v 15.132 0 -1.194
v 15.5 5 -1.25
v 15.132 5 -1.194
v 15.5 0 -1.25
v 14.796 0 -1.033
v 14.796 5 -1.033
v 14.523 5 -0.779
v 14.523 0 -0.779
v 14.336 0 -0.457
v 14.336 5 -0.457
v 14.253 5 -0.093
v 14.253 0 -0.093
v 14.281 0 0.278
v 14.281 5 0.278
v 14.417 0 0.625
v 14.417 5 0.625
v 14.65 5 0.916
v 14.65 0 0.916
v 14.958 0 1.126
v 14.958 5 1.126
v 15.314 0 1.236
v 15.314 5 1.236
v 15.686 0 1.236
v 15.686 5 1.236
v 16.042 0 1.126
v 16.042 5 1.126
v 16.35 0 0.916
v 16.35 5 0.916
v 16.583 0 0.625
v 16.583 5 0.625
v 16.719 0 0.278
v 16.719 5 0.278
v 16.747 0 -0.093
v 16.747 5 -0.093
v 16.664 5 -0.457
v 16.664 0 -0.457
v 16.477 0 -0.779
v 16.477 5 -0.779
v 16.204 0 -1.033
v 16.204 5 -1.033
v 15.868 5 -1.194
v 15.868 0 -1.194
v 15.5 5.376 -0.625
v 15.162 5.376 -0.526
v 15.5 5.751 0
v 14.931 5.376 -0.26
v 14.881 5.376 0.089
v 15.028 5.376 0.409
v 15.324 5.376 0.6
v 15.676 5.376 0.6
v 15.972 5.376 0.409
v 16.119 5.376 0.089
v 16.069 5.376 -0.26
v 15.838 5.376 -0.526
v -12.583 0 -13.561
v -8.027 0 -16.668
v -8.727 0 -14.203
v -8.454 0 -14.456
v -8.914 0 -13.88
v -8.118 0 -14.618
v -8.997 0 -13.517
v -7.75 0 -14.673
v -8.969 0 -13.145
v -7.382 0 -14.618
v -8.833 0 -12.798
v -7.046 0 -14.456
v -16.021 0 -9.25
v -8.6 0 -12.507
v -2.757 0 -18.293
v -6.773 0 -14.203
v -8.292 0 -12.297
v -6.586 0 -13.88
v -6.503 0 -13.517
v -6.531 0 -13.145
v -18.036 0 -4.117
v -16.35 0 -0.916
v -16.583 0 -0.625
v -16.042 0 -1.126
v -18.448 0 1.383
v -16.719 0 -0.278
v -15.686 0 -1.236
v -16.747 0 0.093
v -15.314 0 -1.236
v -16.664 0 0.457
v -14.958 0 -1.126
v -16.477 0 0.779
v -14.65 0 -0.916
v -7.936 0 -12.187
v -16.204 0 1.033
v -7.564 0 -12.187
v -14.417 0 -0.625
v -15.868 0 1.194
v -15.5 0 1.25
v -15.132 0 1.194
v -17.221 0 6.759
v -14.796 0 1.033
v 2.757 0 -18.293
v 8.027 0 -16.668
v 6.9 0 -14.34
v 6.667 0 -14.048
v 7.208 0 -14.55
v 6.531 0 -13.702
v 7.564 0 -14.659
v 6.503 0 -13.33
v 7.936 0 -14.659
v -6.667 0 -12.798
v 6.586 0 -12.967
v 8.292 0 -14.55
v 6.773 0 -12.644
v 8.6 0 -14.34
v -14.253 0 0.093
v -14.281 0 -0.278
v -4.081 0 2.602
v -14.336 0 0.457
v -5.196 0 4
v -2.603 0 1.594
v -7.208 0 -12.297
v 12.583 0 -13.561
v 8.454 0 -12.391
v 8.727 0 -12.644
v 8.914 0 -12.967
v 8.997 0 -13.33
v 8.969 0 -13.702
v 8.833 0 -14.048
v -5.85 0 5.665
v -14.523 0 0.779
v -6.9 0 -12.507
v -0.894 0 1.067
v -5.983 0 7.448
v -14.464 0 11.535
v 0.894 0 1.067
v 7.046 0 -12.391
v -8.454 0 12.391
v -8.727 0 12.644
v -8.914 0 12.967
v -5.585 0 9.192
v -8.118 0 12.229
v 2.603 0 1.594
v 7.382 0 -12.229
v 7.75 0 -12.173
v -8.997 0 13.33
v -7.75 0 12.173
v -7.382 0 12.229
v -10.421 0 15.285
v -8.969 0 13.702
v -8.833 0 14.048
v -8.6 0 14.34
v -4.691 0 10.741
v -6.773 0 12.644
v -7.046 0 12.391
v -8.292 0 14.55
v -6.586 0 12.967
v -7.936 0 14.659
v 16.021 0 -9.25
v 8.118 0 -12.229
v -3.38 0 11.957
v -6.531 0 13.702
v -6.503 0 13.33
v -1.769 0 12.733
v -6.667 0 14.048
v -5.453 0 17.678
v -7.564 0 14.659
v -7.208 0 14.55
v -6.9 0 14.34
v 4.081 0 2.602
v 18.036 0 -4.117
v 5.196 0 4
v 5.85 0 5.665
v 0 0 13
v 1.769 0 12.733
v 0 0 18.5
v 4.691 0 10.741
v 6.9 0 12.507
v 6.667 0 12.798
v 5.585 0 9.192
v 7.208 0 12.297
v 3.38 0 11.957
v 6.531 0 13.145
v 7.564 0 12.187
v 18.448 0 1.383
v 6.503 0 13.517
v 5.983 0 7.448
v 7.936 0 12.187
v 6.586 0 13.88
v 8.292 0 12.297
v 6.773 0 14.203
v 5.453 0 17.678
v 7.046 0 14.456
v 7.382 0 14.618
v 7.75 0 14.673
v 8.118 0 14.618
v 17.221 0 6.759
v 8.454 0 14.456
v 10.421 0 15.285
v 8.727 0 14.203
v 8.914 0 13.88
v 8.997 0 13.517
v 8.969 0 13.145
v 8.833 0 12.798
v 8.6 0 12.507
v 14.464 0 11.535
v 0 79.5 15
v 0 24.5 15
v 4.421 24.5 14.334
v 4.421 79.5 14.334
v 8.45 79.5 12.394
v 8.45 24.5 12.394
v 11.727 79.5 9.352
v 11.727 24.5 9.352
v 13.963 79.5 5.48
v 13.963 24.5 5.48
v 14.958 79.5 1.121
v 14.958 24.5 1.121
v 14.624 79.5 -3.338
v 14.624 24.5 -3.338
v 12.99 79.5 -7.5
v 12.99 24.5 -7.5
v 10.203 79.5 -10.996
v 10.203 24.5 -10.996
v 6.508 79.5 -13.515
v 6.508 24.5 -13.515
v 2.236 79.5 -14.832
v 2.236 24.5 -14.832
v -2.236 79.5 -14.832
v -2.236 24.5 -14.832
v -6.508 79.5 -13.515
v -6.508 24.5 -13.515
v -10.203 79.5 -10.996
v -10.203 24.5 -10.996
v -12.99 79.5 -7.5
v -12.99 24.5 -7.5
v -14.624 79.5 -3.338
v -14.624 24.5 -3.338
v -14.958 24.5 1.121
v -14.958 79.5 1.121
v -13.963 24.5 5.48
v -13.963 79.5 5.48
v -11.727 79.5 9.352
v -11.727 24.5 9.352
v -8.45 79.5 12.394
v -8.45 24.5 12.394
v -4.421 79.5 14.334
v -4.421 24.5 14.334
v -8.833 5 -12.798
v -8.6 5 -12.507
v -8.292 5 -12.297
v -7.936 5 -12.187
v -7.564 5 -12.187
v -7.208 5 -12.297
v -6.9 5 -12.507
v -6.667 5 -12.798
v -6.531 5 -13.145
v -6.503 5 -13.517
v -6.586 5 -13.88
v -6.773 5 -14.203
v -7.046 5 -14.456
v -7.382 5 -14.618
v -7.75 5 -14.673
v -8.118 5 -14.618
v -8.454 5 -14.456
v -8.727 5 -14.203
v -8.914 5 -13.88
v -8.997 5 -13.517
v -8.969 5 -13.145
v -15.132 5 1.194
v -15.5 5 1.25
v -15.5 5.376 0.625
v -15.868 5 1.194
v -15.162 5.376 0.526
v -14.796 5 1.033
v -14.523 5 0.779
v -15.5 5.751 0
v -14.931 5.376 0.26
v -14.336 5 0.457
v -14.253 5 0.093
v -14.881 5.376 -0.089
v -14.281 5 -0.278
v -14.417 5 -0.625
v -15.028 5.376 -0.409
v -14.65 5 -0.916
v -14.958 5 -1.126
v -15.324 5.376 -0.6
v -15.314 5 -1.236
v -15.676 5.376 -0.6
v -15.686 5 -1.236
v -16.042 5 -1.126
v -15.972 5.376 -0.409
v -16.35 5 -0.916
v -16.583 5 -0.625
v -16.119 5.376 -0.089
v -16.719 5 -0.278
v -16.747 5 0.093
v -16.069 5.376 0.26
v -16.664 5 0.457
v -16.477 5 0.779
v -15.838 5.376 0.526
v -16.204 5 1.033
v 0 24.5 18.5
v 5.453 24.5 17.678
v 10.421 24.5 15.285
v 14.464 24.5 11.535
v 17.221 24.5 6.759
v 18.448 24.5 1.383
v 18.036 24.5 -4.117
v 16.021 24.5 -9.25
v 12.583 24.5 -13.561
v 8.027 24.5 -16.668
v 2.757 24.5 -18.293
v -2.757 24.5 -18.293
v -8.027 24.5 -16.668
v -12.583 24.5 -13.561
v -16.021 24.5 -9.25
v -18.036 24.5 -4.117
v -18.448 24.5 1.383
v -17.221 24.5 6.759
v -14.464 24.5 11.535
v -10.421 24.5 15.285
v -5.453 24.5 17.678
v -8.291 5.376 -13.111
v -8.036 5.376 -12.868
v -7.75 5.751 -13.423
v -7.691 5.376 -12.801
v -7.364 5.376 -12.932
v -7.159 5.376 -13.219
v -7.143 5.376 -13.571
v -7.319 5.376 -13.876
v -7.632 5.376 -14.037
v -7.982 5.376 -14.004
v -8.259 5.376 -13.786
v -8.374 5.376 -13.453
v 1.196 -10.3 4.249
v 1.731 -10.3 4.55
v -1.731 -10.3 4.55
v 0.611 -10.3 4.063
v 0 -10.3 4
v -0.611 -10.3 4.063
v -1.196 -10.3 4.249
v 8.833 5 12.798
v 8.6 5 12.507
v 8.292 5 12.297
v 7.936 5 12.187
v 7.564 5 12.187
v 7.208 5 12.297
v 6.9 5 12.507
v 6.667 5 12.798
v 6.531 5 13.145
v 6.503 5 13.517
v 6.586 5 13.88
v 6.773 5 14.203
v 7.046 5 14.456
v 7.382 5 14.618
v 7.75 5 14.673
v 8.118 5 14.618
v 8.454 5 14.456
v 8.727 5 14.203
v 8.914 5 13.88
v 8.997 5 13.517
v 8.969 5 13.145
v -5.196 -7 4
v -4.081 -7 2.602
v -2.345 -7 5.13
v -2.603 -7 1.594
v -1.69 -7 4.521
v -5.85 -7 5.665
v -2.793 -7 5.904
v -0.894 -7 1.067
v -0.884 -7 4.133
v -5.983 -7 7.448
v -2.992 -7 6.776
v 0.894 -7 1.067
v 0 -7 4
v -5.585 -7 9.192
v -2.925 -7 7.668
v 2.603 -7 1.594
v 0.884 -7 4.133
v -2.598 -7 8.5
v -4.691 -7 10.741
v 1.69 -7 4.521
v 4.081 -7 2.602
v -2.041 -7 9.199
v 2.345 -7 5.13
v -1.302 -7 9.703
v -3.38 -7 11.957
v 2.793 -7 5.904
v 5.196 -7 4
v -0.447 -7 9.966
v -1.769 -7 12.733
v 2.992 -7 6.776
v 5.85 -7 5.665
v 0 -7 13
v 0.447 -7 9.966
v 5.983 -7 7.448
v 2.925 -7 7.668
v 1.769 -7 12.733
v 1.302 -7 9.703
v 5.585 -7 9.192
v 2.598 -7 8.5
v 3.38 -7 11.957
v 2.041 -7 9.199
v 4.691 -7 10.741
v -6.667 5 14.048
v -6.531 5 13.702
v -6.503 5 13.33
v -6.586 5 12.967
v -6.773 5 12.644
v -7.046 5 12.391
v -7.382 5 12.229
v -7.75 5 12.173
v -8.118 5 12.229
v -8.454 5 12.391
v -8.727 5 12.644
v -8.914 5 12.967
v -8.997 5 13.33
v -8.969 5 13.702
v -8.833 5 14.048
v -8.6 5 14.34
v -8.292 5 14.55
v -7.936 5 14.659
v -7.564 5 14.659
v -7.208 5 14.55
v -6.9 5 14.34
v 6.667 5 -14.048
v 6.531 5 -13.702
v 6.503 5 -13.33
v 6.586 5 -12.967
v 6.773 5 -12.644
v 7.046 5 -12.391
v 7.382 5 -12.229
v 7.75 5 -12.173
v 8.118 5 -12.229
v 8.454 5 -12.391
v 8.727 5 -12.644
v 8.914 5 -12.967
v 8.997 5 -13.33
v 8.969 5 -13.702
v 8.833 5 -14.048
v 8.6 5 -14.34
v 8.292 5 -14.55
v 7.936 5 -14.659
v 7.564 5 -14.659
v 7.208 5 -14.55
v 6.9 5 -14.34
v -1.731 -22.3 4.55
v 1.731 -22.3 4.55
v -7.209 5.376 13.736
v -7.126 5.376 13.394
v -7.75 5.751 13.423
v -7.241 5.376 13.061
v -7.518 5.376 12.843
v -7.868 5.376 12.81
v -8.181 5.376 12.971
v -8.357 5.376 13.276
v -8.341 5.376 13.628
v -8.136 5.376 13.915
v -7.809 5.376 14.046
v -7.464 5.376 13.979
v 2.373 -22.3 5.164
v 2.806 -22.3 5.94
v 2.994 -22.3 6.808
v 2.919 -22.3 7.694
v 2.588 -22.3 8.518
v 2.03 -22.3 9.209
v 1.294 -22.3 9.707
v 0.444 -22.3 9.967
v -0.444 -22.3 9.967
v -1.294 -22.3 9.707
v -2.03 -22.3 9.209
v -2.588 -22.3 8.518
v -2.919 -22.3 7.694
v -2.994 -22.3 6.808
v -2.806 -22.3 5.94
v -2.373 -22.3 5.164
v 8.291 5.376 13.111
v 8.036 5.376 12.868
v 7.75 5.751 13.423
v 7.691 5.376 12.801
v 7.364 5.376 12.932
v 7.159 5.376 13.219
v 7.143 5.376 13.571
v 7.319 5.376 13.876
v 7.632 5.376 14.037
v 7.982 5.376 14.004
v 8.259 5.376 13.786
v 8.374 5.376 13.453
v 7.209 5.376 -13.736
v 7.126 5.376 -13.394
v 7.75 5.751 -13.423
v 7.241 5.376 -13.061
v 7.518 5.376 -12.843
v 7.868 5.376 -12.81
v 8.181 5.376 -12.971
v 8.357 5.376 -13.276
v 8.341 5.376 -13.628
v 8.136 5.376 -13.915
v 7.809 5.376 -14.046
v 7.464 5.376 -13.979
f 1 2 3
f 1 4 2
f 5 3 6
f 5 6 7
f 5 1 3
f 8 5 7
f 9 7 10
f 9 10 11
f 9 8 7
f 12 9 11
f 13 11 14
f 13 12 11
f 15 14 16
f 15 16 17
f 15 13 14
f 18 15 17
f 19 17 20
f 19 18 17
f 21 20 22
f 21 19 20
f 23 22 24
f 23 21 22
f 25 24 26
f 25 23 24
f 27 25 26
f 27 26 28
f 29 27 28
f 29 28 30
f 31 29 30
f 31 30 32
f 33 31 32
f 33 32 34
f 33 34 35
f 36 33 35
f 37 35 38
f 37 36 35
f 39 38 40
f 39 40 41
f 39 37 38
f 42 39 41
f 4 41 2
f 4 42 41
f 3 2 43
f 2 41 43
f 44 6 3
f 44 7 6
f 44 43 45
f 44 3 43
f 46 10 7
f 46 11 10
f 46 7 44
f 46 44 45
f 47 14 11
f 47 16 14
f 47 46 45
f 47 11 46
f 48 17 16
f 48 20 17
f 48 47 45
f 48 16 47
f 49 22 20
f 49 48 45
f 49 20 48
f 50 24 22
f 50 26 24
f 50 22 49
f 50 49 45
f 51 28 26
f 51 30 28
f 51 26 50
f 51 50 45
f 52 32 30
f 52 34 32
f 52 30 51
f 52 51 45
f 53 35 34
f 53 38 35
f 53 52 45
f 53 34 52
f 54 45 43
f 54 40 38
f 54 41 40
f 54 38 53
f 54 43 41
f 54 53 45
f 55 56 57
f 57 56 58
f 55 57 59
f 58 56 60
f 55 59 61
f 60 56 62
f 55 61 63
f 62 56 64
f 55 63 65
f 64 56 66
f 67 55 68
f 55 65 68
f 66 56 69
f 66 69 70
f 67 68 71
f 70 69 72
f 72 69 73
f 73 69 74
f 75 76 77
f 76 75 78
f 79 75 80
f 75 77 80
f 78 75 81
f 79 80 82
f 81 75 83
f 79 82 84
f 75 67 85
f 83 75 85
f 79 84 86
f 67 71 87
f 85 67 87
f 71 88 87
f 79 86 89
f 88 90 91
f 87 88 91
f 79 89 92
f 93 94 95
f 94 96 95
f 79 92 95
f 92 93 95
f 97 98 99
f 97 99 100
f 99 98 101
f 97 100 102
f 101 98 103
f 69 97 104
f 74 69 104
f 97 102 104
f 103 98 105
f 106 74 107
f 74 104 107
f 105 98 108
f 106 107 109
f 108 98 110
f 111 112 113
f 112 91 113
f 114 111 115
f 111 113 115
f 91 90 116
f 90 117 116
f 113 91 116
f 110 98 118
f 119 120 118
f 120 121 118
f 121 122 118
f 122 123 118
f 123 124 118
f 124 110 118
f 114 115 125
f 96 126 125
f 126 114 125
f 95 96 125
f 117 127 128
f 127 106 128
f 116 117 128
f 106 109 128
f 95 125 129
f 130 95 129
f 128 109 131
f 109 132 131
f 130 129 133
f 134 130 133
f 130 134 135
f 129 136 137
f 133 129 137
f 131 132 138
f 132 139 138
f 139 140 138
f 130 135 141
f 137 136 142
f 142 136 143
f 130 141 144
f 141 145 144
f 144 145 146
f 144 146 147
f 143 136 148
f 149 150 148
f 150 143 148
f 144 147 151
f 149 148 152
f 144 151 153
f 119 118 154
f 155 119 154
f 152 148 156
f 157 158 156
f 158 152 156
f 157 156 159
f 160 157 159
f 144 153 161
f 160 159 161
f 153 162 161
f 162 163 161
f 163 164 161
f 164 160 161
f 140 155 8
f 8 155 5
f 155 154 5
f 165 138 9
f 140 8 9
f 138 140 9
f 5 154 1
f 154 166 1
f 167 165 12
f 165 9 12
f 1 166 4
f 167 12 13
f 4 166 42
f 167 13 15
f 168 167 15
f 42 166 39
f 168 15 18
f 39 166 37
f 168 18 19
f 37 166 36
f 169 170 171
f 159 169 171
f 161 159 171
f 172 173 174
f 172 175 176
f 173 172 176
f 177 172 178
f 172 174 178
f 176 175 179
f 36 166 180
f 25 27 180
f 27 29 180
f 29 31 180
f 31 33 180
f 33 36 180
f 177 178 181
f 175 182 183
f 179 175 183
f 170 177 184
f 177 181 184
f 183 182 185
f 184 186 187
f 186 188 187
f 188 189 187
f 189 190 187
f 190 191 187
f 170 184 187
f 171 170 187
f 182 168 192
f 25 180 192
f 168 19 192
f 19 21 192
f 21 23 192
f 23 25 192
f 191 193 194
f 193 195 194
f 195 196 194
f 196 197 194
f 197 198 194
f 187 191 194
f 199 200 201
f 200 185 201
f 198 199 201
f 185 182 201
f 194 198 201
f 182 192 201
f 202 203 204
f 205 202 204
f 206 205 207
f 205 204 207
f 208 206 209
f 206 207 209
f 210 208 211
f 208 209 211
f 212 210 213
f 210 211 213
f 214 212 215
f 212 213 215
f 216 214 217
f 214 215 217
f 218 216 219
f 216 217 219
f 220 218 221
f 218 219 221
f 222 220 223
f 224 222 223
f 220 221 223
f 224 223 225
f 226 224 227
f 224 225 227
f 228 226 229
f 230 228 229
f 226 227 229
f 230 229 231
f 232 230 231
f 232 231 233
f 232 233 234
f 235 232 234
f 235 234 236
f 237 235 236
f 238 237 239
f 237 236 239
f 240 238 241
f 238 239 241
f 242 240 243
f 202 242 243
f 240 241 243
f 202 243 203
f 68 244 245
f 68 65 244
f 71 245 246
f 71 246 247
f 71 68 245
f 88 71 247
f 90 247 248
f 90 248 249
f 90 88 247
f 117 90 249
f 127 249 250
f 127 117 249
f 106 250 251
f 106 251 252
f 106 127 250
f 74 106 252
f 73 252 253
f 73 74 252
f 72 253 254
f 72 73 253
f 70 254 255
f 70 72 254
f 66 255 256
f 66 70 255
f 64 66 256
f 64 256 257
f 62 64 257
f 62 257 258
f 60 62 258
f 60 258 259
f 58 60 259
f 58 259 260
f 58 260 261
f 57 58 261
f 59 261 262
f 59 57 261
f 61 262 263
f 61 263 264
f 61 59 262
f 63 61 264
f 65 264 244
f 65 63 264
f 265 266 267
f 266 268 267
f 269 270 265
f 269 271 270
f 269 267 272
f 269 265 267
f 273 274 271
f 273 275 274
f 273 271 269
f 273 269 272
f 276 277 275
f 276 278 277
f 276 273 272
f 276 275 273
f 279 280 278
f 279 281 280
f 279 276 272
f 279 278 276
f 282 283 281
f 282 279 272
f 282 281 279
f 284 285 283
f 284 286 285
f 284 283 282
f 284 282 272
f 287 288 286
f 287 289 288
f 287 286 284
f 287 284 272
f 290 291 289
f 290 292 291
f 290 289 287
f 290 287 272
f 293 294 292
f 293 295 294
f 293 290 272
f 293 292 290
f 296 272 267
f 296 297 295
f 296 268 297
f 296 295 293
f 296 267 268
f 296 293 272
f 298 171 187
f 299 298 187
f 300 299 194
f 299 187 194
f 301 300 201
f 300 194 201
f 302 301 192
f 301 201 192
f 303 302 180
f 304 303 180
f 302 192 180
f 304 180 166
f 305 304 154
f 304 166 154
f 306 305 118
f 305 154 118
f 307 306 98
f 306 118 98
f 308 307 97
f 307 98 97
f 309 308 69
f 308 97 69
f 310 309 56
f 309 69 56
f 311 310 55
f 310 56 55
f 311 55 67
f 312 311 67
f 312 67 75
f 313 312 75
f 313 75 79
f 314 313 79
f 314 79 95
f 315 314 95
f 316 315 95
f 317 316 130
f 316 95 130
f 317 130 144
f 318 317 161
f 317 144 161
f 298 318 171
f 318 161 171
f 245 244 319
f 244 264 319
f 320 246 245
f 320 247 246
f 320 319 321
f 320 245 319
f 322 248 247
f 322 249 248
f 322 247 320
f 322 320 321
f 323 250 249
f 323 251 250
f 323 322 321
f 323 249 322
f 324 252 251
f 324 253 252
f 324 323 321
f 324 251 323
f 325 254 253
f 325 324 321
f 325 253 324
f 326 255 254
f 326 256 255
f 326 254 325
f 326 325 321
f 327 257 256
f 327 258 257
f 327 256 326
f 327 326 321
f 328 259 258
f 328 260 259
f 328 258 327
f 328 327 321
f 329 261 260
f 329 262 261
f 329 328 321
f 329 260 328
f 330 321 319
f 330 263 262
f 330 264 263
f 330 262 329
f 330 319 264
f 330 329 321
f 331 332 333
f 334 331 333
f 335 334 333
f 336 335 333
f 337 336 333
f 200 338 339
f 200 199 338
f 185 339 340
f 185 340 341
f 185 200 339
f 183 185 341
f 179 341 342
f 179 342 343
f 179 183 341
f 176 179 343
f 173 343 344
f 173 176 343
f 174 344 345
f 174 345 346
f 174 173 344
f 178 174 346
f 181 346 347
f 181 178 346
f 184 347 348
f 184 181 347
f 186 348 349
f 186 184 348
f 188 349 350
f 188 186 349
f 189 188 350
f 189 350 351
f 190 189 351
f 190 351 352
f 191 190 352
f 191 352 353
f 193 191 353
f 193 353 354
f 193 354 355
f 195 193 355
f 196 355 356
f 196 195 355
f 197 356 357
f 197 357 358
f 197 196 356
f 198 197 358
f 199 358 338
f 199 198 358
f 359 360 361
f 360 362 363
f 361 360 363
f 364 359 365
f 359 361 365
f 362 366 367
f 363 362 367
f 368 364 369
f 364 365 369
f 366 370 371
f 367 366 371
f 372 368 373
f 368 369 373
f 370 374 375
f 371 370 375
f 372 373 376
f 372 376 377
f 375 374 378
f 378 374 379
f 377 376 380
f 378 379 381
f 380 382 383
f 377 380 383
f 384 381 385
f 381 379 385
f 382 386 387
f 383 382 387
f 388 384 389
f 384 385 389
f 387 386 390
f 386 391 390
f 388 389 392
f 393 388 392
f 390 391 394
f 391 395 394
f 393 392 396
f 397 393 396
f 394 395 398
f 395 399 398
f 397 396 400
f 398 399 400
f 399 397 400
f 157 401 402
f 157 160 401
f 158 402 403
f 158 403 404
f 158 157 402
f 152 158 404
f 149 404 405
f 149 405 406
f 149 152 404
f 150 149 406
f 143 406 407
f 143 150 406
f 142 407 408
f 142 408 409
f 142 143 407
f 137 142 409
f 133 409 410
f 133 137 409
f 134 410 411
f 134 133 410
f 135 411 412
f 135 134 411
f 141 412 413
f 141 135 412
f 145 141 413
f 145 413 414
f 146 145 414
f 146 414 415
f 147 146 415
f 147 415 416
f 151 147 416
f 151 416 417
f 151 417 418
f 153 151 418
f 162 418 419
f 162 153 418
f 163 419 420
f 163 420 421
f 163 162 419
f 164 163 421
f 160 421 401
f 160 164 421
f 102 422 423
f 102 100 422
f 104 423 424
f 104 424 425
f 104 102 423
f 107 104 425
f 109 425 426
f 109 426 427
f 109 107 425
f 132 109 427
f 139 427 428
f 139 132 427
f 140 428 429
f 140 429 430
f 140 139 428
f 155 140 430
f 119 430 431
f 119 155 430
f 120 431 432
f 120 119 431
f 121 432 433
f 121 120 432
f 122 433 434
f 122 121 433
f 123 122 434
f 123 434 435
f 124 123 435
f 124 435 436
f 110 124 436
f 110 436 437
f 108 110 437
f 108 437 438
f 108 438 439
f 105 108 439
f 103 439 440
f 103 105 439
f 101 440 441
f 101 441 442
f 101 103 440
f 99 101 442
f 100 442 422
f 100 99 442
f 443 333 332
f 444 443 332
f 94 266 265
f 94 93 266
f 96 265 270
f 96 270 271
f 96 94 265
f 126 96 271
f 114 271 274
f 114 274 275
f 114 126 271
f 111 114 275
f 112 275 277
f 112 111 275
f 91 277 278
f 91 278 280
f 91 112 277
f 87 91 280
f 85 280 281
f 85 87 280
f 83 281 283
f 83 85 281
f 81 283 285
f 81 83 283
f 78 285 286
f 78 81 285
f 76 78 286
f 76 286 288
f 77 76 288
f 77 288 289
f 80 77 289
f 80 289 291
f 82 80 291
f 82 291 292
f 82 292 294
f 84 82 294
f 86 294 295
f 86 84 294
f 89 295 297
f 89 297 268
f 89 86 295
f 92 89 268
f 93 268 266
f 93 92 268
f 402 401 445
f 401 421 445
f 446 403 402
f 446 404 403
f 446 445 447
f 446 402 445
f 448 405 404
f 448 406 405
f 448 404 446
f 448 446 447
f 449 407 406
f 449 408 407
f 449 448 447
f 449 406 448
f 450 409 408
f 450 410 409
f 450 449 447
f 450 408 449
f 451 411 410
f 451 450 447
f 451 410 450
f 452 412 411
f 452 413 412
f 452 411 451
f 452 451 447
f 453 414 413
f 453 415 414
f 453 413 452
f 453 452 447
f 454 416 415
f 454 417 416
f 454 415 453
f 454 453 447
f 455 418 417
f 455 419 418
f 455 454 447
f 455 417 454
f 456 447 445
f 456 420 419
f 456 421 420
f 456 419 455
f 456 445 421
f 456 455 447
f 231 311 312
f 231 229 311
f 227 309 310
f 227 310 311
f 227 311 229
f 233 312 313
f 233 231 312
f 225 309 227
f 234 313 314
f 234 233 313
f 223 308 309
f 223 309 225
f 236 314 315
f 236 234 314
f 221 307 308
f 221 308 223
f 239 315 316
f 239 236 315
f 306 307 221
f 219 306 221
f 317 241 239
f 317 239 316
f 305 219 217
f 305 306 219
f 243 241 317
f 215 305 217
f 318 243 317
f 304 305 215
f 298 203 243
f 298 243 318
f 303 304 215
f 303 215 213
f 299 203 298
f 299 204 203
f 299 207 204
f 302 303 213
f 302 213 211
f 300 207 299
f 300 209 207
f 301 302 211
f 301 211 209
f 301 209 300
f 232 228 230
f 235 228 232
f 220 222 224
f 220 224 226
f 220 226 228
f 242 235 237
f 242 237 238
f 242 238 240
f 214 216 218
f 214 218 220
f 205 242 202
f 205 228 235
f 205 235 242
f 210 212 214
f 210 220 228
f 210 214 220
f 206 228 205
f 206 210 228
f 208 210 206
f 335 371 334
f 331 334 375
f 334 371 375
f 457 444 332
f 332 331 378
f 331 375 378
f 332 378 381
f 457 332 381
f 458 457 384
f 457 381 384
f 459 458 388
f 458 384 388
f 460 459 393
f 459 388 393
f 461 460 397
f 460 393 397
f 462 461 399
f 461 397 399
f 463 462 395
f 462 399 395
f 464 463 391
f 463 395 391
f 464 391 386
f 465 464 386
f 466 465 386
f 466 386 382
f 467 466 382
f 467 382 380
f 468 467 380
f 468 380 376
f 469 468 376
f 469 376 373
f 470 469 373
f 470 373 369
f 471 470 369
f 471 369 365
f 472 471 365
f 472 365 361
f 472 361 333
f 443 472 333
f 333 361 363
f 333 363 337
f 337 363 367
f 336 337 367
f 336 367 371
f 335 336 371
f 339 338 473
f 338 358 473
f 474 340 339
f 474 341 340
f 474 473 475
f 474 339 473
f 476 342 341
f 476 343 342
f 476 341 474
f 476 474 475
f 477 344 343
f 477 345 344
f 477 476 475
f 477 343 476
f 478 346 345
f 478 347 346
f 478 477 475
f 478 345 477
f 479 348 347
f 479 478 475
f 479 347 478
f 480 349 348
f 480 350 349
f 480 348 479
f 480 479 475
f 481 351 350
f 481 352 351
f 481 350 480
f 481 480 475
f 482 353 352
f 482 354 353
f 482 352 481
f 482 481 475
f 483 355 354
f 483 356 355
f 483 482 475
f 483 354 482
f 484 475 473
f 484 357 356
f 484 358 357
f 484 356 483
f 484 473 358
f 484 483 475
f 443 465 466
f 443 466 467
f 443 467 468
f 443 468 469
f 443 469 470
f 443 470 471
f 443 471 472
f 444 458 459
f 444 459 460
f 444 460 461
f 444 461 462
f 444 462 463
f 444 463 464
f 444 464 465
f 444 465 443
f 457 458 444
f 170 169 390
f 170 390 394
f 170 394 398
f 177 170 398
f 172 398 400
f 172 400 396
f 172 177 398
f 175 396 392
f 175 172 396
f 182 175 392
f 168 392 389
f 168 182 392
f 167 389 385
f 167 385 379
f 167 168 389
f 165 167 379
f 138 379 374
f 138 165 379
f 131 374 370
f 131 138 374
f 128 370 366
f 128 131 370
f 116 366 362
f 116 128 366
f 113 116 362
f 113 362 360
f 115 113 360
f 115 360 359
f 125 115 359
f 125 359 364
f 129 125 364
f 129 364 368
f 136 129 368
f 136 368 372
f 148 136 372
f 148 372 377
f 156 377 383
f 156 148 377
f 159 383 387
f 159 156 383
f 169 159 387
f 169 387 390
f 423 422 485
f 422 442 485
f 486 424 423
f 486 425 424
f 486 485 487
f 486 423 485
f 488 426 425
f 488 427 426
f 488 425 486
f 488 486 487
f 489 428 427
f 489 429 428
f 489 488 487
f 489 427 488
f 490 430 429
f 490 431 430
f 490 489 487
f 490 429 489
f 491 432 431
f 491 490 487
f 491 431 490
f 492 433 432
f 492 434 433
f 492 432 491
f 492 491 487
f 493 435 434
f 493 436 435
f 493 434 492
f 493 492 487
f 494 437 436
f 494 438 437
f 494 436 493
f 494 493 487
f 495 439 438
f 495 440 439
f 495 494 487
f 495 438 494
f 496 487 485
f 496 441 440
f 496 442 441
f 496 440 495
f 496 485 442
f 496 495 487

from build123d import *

# Parameters (mm, degrees)
ESQUISSE1_R                  = 18.5
BOSS_EXTRU_1_DEPTH           = 24.5
ESQUISSE2_R                  = 15
BOSS_EXTRU_2_DEPTH           = 55
ESQUISSE3_R                  = 6
BOSS_EXTRU_3_DEPTH           = 7
ESQUISSE4_R                  = 3
BOSS_EXTRU_4_DEPTH           = 15.3
ENL_V_START                  = -12
ENL_V_MAT_EXTRU_1_DEPTH      = 12
R_P_TITION_CIRCULAIRE1_COUNT = 6


with BuildPart() as part:
    # Esquisse1 → Boss.-Extru.1 (new body)
    with BuildSketch(Plane(origin=(0, 0, 0), x_dir=(1, 0, 0), z_dir=(0, 1, 0))):
        with Locations(Location((0, 0, 0), (0, 0, 270))):
            Circle(ESQUISSE1_R)
    extrude(amount=BOSS_EXTRU_1_DEPTH)

    # Esquisse2 → Boss.-Extru.2 (add)
    with BuildSketch(Plane(origin=(0, 24.5, 0), x_dir=(1, 0, 0), z_dir=(0, 1, 0))):
        with Locations(Location((0, 0, 0), (0, 0, 270))):
            Circle(ESQUISSE2_R)
    extrude(amount=BOSS_EXTRU_2_DEPTH)

    # Esquisse3 → Boss.-Extru.3 (add)
    with BuildSketch(Plane(origin=(0, 0, 0), x_dir=(1, 0, 0), z_dir=(0, 1, 0))):
        with Locations(Location((0, -7, 0), (0, 0, 270))):
            Circle(ESQUISSE3_R)
    extrude(amount=-BOSS_EXTRU_3_DEPTH)

    # Esquisse4 → Boss.-Extru.4 (add)
    with BuildSketch(Plane.XZ.offset(7)):
        with Locations(Location((0, 7, 0), (0, 0, 270))):
            Circle(ESQUISSE4_R)
    extrude(amount=BOSS_EXTRU_4_DEPTH)

    # Esquisse5 → Enlèv. mat.-Extru.1 (cut)
    with BuildSketch(Plane.XZ.offset(22.3).offset(ENL_V_START)):
        with BuildLine():
            Line((-1.731328969, 4.55), (1.731328969, 4.55))
            ThreePointArc((1.731328969, 4.55), (0, 4), (-1.731328969, 4.55))
        make_face()
    extrude(amount=ENL_V_MAT_EXTRU_1_DEPTH, mode=Mode.SUBTRACT)

    # Esquisse7 → Trou taraudé M31 (revolve, cut)
    with BuildSketch(Plane(origin=(15.5, 0, 0), x_dir=(0, 0, -1), z_dir=(1, 0, 0))):
        Polygon((0, 0), (0, 5.751075774), (1.25, 5), (1.25, 0), align=None)
    trou_taraud_m31 = revolve(axis=Axis((15.5, -6.35, 0), (0, 1, 0)), mode=Mode.SUBTRACT)

    # Répétition circulaire1: Trou taraudé M31 ×6 about axis
    r_p_tition_circulaire1_axis = Axis((0, 0, 0), (0, 1, 0))
    for i in range(1, R_P_TITION_CIRCULAIRE1_COUNT):
        add(trou_taraud_m31.rotate(r_p_tition_circulaire1_axis, i * 360 / R_P_TITION_CIRCULAIRE1_COUNT), mode=Mode.SUBTRACT)


solid = part.part
